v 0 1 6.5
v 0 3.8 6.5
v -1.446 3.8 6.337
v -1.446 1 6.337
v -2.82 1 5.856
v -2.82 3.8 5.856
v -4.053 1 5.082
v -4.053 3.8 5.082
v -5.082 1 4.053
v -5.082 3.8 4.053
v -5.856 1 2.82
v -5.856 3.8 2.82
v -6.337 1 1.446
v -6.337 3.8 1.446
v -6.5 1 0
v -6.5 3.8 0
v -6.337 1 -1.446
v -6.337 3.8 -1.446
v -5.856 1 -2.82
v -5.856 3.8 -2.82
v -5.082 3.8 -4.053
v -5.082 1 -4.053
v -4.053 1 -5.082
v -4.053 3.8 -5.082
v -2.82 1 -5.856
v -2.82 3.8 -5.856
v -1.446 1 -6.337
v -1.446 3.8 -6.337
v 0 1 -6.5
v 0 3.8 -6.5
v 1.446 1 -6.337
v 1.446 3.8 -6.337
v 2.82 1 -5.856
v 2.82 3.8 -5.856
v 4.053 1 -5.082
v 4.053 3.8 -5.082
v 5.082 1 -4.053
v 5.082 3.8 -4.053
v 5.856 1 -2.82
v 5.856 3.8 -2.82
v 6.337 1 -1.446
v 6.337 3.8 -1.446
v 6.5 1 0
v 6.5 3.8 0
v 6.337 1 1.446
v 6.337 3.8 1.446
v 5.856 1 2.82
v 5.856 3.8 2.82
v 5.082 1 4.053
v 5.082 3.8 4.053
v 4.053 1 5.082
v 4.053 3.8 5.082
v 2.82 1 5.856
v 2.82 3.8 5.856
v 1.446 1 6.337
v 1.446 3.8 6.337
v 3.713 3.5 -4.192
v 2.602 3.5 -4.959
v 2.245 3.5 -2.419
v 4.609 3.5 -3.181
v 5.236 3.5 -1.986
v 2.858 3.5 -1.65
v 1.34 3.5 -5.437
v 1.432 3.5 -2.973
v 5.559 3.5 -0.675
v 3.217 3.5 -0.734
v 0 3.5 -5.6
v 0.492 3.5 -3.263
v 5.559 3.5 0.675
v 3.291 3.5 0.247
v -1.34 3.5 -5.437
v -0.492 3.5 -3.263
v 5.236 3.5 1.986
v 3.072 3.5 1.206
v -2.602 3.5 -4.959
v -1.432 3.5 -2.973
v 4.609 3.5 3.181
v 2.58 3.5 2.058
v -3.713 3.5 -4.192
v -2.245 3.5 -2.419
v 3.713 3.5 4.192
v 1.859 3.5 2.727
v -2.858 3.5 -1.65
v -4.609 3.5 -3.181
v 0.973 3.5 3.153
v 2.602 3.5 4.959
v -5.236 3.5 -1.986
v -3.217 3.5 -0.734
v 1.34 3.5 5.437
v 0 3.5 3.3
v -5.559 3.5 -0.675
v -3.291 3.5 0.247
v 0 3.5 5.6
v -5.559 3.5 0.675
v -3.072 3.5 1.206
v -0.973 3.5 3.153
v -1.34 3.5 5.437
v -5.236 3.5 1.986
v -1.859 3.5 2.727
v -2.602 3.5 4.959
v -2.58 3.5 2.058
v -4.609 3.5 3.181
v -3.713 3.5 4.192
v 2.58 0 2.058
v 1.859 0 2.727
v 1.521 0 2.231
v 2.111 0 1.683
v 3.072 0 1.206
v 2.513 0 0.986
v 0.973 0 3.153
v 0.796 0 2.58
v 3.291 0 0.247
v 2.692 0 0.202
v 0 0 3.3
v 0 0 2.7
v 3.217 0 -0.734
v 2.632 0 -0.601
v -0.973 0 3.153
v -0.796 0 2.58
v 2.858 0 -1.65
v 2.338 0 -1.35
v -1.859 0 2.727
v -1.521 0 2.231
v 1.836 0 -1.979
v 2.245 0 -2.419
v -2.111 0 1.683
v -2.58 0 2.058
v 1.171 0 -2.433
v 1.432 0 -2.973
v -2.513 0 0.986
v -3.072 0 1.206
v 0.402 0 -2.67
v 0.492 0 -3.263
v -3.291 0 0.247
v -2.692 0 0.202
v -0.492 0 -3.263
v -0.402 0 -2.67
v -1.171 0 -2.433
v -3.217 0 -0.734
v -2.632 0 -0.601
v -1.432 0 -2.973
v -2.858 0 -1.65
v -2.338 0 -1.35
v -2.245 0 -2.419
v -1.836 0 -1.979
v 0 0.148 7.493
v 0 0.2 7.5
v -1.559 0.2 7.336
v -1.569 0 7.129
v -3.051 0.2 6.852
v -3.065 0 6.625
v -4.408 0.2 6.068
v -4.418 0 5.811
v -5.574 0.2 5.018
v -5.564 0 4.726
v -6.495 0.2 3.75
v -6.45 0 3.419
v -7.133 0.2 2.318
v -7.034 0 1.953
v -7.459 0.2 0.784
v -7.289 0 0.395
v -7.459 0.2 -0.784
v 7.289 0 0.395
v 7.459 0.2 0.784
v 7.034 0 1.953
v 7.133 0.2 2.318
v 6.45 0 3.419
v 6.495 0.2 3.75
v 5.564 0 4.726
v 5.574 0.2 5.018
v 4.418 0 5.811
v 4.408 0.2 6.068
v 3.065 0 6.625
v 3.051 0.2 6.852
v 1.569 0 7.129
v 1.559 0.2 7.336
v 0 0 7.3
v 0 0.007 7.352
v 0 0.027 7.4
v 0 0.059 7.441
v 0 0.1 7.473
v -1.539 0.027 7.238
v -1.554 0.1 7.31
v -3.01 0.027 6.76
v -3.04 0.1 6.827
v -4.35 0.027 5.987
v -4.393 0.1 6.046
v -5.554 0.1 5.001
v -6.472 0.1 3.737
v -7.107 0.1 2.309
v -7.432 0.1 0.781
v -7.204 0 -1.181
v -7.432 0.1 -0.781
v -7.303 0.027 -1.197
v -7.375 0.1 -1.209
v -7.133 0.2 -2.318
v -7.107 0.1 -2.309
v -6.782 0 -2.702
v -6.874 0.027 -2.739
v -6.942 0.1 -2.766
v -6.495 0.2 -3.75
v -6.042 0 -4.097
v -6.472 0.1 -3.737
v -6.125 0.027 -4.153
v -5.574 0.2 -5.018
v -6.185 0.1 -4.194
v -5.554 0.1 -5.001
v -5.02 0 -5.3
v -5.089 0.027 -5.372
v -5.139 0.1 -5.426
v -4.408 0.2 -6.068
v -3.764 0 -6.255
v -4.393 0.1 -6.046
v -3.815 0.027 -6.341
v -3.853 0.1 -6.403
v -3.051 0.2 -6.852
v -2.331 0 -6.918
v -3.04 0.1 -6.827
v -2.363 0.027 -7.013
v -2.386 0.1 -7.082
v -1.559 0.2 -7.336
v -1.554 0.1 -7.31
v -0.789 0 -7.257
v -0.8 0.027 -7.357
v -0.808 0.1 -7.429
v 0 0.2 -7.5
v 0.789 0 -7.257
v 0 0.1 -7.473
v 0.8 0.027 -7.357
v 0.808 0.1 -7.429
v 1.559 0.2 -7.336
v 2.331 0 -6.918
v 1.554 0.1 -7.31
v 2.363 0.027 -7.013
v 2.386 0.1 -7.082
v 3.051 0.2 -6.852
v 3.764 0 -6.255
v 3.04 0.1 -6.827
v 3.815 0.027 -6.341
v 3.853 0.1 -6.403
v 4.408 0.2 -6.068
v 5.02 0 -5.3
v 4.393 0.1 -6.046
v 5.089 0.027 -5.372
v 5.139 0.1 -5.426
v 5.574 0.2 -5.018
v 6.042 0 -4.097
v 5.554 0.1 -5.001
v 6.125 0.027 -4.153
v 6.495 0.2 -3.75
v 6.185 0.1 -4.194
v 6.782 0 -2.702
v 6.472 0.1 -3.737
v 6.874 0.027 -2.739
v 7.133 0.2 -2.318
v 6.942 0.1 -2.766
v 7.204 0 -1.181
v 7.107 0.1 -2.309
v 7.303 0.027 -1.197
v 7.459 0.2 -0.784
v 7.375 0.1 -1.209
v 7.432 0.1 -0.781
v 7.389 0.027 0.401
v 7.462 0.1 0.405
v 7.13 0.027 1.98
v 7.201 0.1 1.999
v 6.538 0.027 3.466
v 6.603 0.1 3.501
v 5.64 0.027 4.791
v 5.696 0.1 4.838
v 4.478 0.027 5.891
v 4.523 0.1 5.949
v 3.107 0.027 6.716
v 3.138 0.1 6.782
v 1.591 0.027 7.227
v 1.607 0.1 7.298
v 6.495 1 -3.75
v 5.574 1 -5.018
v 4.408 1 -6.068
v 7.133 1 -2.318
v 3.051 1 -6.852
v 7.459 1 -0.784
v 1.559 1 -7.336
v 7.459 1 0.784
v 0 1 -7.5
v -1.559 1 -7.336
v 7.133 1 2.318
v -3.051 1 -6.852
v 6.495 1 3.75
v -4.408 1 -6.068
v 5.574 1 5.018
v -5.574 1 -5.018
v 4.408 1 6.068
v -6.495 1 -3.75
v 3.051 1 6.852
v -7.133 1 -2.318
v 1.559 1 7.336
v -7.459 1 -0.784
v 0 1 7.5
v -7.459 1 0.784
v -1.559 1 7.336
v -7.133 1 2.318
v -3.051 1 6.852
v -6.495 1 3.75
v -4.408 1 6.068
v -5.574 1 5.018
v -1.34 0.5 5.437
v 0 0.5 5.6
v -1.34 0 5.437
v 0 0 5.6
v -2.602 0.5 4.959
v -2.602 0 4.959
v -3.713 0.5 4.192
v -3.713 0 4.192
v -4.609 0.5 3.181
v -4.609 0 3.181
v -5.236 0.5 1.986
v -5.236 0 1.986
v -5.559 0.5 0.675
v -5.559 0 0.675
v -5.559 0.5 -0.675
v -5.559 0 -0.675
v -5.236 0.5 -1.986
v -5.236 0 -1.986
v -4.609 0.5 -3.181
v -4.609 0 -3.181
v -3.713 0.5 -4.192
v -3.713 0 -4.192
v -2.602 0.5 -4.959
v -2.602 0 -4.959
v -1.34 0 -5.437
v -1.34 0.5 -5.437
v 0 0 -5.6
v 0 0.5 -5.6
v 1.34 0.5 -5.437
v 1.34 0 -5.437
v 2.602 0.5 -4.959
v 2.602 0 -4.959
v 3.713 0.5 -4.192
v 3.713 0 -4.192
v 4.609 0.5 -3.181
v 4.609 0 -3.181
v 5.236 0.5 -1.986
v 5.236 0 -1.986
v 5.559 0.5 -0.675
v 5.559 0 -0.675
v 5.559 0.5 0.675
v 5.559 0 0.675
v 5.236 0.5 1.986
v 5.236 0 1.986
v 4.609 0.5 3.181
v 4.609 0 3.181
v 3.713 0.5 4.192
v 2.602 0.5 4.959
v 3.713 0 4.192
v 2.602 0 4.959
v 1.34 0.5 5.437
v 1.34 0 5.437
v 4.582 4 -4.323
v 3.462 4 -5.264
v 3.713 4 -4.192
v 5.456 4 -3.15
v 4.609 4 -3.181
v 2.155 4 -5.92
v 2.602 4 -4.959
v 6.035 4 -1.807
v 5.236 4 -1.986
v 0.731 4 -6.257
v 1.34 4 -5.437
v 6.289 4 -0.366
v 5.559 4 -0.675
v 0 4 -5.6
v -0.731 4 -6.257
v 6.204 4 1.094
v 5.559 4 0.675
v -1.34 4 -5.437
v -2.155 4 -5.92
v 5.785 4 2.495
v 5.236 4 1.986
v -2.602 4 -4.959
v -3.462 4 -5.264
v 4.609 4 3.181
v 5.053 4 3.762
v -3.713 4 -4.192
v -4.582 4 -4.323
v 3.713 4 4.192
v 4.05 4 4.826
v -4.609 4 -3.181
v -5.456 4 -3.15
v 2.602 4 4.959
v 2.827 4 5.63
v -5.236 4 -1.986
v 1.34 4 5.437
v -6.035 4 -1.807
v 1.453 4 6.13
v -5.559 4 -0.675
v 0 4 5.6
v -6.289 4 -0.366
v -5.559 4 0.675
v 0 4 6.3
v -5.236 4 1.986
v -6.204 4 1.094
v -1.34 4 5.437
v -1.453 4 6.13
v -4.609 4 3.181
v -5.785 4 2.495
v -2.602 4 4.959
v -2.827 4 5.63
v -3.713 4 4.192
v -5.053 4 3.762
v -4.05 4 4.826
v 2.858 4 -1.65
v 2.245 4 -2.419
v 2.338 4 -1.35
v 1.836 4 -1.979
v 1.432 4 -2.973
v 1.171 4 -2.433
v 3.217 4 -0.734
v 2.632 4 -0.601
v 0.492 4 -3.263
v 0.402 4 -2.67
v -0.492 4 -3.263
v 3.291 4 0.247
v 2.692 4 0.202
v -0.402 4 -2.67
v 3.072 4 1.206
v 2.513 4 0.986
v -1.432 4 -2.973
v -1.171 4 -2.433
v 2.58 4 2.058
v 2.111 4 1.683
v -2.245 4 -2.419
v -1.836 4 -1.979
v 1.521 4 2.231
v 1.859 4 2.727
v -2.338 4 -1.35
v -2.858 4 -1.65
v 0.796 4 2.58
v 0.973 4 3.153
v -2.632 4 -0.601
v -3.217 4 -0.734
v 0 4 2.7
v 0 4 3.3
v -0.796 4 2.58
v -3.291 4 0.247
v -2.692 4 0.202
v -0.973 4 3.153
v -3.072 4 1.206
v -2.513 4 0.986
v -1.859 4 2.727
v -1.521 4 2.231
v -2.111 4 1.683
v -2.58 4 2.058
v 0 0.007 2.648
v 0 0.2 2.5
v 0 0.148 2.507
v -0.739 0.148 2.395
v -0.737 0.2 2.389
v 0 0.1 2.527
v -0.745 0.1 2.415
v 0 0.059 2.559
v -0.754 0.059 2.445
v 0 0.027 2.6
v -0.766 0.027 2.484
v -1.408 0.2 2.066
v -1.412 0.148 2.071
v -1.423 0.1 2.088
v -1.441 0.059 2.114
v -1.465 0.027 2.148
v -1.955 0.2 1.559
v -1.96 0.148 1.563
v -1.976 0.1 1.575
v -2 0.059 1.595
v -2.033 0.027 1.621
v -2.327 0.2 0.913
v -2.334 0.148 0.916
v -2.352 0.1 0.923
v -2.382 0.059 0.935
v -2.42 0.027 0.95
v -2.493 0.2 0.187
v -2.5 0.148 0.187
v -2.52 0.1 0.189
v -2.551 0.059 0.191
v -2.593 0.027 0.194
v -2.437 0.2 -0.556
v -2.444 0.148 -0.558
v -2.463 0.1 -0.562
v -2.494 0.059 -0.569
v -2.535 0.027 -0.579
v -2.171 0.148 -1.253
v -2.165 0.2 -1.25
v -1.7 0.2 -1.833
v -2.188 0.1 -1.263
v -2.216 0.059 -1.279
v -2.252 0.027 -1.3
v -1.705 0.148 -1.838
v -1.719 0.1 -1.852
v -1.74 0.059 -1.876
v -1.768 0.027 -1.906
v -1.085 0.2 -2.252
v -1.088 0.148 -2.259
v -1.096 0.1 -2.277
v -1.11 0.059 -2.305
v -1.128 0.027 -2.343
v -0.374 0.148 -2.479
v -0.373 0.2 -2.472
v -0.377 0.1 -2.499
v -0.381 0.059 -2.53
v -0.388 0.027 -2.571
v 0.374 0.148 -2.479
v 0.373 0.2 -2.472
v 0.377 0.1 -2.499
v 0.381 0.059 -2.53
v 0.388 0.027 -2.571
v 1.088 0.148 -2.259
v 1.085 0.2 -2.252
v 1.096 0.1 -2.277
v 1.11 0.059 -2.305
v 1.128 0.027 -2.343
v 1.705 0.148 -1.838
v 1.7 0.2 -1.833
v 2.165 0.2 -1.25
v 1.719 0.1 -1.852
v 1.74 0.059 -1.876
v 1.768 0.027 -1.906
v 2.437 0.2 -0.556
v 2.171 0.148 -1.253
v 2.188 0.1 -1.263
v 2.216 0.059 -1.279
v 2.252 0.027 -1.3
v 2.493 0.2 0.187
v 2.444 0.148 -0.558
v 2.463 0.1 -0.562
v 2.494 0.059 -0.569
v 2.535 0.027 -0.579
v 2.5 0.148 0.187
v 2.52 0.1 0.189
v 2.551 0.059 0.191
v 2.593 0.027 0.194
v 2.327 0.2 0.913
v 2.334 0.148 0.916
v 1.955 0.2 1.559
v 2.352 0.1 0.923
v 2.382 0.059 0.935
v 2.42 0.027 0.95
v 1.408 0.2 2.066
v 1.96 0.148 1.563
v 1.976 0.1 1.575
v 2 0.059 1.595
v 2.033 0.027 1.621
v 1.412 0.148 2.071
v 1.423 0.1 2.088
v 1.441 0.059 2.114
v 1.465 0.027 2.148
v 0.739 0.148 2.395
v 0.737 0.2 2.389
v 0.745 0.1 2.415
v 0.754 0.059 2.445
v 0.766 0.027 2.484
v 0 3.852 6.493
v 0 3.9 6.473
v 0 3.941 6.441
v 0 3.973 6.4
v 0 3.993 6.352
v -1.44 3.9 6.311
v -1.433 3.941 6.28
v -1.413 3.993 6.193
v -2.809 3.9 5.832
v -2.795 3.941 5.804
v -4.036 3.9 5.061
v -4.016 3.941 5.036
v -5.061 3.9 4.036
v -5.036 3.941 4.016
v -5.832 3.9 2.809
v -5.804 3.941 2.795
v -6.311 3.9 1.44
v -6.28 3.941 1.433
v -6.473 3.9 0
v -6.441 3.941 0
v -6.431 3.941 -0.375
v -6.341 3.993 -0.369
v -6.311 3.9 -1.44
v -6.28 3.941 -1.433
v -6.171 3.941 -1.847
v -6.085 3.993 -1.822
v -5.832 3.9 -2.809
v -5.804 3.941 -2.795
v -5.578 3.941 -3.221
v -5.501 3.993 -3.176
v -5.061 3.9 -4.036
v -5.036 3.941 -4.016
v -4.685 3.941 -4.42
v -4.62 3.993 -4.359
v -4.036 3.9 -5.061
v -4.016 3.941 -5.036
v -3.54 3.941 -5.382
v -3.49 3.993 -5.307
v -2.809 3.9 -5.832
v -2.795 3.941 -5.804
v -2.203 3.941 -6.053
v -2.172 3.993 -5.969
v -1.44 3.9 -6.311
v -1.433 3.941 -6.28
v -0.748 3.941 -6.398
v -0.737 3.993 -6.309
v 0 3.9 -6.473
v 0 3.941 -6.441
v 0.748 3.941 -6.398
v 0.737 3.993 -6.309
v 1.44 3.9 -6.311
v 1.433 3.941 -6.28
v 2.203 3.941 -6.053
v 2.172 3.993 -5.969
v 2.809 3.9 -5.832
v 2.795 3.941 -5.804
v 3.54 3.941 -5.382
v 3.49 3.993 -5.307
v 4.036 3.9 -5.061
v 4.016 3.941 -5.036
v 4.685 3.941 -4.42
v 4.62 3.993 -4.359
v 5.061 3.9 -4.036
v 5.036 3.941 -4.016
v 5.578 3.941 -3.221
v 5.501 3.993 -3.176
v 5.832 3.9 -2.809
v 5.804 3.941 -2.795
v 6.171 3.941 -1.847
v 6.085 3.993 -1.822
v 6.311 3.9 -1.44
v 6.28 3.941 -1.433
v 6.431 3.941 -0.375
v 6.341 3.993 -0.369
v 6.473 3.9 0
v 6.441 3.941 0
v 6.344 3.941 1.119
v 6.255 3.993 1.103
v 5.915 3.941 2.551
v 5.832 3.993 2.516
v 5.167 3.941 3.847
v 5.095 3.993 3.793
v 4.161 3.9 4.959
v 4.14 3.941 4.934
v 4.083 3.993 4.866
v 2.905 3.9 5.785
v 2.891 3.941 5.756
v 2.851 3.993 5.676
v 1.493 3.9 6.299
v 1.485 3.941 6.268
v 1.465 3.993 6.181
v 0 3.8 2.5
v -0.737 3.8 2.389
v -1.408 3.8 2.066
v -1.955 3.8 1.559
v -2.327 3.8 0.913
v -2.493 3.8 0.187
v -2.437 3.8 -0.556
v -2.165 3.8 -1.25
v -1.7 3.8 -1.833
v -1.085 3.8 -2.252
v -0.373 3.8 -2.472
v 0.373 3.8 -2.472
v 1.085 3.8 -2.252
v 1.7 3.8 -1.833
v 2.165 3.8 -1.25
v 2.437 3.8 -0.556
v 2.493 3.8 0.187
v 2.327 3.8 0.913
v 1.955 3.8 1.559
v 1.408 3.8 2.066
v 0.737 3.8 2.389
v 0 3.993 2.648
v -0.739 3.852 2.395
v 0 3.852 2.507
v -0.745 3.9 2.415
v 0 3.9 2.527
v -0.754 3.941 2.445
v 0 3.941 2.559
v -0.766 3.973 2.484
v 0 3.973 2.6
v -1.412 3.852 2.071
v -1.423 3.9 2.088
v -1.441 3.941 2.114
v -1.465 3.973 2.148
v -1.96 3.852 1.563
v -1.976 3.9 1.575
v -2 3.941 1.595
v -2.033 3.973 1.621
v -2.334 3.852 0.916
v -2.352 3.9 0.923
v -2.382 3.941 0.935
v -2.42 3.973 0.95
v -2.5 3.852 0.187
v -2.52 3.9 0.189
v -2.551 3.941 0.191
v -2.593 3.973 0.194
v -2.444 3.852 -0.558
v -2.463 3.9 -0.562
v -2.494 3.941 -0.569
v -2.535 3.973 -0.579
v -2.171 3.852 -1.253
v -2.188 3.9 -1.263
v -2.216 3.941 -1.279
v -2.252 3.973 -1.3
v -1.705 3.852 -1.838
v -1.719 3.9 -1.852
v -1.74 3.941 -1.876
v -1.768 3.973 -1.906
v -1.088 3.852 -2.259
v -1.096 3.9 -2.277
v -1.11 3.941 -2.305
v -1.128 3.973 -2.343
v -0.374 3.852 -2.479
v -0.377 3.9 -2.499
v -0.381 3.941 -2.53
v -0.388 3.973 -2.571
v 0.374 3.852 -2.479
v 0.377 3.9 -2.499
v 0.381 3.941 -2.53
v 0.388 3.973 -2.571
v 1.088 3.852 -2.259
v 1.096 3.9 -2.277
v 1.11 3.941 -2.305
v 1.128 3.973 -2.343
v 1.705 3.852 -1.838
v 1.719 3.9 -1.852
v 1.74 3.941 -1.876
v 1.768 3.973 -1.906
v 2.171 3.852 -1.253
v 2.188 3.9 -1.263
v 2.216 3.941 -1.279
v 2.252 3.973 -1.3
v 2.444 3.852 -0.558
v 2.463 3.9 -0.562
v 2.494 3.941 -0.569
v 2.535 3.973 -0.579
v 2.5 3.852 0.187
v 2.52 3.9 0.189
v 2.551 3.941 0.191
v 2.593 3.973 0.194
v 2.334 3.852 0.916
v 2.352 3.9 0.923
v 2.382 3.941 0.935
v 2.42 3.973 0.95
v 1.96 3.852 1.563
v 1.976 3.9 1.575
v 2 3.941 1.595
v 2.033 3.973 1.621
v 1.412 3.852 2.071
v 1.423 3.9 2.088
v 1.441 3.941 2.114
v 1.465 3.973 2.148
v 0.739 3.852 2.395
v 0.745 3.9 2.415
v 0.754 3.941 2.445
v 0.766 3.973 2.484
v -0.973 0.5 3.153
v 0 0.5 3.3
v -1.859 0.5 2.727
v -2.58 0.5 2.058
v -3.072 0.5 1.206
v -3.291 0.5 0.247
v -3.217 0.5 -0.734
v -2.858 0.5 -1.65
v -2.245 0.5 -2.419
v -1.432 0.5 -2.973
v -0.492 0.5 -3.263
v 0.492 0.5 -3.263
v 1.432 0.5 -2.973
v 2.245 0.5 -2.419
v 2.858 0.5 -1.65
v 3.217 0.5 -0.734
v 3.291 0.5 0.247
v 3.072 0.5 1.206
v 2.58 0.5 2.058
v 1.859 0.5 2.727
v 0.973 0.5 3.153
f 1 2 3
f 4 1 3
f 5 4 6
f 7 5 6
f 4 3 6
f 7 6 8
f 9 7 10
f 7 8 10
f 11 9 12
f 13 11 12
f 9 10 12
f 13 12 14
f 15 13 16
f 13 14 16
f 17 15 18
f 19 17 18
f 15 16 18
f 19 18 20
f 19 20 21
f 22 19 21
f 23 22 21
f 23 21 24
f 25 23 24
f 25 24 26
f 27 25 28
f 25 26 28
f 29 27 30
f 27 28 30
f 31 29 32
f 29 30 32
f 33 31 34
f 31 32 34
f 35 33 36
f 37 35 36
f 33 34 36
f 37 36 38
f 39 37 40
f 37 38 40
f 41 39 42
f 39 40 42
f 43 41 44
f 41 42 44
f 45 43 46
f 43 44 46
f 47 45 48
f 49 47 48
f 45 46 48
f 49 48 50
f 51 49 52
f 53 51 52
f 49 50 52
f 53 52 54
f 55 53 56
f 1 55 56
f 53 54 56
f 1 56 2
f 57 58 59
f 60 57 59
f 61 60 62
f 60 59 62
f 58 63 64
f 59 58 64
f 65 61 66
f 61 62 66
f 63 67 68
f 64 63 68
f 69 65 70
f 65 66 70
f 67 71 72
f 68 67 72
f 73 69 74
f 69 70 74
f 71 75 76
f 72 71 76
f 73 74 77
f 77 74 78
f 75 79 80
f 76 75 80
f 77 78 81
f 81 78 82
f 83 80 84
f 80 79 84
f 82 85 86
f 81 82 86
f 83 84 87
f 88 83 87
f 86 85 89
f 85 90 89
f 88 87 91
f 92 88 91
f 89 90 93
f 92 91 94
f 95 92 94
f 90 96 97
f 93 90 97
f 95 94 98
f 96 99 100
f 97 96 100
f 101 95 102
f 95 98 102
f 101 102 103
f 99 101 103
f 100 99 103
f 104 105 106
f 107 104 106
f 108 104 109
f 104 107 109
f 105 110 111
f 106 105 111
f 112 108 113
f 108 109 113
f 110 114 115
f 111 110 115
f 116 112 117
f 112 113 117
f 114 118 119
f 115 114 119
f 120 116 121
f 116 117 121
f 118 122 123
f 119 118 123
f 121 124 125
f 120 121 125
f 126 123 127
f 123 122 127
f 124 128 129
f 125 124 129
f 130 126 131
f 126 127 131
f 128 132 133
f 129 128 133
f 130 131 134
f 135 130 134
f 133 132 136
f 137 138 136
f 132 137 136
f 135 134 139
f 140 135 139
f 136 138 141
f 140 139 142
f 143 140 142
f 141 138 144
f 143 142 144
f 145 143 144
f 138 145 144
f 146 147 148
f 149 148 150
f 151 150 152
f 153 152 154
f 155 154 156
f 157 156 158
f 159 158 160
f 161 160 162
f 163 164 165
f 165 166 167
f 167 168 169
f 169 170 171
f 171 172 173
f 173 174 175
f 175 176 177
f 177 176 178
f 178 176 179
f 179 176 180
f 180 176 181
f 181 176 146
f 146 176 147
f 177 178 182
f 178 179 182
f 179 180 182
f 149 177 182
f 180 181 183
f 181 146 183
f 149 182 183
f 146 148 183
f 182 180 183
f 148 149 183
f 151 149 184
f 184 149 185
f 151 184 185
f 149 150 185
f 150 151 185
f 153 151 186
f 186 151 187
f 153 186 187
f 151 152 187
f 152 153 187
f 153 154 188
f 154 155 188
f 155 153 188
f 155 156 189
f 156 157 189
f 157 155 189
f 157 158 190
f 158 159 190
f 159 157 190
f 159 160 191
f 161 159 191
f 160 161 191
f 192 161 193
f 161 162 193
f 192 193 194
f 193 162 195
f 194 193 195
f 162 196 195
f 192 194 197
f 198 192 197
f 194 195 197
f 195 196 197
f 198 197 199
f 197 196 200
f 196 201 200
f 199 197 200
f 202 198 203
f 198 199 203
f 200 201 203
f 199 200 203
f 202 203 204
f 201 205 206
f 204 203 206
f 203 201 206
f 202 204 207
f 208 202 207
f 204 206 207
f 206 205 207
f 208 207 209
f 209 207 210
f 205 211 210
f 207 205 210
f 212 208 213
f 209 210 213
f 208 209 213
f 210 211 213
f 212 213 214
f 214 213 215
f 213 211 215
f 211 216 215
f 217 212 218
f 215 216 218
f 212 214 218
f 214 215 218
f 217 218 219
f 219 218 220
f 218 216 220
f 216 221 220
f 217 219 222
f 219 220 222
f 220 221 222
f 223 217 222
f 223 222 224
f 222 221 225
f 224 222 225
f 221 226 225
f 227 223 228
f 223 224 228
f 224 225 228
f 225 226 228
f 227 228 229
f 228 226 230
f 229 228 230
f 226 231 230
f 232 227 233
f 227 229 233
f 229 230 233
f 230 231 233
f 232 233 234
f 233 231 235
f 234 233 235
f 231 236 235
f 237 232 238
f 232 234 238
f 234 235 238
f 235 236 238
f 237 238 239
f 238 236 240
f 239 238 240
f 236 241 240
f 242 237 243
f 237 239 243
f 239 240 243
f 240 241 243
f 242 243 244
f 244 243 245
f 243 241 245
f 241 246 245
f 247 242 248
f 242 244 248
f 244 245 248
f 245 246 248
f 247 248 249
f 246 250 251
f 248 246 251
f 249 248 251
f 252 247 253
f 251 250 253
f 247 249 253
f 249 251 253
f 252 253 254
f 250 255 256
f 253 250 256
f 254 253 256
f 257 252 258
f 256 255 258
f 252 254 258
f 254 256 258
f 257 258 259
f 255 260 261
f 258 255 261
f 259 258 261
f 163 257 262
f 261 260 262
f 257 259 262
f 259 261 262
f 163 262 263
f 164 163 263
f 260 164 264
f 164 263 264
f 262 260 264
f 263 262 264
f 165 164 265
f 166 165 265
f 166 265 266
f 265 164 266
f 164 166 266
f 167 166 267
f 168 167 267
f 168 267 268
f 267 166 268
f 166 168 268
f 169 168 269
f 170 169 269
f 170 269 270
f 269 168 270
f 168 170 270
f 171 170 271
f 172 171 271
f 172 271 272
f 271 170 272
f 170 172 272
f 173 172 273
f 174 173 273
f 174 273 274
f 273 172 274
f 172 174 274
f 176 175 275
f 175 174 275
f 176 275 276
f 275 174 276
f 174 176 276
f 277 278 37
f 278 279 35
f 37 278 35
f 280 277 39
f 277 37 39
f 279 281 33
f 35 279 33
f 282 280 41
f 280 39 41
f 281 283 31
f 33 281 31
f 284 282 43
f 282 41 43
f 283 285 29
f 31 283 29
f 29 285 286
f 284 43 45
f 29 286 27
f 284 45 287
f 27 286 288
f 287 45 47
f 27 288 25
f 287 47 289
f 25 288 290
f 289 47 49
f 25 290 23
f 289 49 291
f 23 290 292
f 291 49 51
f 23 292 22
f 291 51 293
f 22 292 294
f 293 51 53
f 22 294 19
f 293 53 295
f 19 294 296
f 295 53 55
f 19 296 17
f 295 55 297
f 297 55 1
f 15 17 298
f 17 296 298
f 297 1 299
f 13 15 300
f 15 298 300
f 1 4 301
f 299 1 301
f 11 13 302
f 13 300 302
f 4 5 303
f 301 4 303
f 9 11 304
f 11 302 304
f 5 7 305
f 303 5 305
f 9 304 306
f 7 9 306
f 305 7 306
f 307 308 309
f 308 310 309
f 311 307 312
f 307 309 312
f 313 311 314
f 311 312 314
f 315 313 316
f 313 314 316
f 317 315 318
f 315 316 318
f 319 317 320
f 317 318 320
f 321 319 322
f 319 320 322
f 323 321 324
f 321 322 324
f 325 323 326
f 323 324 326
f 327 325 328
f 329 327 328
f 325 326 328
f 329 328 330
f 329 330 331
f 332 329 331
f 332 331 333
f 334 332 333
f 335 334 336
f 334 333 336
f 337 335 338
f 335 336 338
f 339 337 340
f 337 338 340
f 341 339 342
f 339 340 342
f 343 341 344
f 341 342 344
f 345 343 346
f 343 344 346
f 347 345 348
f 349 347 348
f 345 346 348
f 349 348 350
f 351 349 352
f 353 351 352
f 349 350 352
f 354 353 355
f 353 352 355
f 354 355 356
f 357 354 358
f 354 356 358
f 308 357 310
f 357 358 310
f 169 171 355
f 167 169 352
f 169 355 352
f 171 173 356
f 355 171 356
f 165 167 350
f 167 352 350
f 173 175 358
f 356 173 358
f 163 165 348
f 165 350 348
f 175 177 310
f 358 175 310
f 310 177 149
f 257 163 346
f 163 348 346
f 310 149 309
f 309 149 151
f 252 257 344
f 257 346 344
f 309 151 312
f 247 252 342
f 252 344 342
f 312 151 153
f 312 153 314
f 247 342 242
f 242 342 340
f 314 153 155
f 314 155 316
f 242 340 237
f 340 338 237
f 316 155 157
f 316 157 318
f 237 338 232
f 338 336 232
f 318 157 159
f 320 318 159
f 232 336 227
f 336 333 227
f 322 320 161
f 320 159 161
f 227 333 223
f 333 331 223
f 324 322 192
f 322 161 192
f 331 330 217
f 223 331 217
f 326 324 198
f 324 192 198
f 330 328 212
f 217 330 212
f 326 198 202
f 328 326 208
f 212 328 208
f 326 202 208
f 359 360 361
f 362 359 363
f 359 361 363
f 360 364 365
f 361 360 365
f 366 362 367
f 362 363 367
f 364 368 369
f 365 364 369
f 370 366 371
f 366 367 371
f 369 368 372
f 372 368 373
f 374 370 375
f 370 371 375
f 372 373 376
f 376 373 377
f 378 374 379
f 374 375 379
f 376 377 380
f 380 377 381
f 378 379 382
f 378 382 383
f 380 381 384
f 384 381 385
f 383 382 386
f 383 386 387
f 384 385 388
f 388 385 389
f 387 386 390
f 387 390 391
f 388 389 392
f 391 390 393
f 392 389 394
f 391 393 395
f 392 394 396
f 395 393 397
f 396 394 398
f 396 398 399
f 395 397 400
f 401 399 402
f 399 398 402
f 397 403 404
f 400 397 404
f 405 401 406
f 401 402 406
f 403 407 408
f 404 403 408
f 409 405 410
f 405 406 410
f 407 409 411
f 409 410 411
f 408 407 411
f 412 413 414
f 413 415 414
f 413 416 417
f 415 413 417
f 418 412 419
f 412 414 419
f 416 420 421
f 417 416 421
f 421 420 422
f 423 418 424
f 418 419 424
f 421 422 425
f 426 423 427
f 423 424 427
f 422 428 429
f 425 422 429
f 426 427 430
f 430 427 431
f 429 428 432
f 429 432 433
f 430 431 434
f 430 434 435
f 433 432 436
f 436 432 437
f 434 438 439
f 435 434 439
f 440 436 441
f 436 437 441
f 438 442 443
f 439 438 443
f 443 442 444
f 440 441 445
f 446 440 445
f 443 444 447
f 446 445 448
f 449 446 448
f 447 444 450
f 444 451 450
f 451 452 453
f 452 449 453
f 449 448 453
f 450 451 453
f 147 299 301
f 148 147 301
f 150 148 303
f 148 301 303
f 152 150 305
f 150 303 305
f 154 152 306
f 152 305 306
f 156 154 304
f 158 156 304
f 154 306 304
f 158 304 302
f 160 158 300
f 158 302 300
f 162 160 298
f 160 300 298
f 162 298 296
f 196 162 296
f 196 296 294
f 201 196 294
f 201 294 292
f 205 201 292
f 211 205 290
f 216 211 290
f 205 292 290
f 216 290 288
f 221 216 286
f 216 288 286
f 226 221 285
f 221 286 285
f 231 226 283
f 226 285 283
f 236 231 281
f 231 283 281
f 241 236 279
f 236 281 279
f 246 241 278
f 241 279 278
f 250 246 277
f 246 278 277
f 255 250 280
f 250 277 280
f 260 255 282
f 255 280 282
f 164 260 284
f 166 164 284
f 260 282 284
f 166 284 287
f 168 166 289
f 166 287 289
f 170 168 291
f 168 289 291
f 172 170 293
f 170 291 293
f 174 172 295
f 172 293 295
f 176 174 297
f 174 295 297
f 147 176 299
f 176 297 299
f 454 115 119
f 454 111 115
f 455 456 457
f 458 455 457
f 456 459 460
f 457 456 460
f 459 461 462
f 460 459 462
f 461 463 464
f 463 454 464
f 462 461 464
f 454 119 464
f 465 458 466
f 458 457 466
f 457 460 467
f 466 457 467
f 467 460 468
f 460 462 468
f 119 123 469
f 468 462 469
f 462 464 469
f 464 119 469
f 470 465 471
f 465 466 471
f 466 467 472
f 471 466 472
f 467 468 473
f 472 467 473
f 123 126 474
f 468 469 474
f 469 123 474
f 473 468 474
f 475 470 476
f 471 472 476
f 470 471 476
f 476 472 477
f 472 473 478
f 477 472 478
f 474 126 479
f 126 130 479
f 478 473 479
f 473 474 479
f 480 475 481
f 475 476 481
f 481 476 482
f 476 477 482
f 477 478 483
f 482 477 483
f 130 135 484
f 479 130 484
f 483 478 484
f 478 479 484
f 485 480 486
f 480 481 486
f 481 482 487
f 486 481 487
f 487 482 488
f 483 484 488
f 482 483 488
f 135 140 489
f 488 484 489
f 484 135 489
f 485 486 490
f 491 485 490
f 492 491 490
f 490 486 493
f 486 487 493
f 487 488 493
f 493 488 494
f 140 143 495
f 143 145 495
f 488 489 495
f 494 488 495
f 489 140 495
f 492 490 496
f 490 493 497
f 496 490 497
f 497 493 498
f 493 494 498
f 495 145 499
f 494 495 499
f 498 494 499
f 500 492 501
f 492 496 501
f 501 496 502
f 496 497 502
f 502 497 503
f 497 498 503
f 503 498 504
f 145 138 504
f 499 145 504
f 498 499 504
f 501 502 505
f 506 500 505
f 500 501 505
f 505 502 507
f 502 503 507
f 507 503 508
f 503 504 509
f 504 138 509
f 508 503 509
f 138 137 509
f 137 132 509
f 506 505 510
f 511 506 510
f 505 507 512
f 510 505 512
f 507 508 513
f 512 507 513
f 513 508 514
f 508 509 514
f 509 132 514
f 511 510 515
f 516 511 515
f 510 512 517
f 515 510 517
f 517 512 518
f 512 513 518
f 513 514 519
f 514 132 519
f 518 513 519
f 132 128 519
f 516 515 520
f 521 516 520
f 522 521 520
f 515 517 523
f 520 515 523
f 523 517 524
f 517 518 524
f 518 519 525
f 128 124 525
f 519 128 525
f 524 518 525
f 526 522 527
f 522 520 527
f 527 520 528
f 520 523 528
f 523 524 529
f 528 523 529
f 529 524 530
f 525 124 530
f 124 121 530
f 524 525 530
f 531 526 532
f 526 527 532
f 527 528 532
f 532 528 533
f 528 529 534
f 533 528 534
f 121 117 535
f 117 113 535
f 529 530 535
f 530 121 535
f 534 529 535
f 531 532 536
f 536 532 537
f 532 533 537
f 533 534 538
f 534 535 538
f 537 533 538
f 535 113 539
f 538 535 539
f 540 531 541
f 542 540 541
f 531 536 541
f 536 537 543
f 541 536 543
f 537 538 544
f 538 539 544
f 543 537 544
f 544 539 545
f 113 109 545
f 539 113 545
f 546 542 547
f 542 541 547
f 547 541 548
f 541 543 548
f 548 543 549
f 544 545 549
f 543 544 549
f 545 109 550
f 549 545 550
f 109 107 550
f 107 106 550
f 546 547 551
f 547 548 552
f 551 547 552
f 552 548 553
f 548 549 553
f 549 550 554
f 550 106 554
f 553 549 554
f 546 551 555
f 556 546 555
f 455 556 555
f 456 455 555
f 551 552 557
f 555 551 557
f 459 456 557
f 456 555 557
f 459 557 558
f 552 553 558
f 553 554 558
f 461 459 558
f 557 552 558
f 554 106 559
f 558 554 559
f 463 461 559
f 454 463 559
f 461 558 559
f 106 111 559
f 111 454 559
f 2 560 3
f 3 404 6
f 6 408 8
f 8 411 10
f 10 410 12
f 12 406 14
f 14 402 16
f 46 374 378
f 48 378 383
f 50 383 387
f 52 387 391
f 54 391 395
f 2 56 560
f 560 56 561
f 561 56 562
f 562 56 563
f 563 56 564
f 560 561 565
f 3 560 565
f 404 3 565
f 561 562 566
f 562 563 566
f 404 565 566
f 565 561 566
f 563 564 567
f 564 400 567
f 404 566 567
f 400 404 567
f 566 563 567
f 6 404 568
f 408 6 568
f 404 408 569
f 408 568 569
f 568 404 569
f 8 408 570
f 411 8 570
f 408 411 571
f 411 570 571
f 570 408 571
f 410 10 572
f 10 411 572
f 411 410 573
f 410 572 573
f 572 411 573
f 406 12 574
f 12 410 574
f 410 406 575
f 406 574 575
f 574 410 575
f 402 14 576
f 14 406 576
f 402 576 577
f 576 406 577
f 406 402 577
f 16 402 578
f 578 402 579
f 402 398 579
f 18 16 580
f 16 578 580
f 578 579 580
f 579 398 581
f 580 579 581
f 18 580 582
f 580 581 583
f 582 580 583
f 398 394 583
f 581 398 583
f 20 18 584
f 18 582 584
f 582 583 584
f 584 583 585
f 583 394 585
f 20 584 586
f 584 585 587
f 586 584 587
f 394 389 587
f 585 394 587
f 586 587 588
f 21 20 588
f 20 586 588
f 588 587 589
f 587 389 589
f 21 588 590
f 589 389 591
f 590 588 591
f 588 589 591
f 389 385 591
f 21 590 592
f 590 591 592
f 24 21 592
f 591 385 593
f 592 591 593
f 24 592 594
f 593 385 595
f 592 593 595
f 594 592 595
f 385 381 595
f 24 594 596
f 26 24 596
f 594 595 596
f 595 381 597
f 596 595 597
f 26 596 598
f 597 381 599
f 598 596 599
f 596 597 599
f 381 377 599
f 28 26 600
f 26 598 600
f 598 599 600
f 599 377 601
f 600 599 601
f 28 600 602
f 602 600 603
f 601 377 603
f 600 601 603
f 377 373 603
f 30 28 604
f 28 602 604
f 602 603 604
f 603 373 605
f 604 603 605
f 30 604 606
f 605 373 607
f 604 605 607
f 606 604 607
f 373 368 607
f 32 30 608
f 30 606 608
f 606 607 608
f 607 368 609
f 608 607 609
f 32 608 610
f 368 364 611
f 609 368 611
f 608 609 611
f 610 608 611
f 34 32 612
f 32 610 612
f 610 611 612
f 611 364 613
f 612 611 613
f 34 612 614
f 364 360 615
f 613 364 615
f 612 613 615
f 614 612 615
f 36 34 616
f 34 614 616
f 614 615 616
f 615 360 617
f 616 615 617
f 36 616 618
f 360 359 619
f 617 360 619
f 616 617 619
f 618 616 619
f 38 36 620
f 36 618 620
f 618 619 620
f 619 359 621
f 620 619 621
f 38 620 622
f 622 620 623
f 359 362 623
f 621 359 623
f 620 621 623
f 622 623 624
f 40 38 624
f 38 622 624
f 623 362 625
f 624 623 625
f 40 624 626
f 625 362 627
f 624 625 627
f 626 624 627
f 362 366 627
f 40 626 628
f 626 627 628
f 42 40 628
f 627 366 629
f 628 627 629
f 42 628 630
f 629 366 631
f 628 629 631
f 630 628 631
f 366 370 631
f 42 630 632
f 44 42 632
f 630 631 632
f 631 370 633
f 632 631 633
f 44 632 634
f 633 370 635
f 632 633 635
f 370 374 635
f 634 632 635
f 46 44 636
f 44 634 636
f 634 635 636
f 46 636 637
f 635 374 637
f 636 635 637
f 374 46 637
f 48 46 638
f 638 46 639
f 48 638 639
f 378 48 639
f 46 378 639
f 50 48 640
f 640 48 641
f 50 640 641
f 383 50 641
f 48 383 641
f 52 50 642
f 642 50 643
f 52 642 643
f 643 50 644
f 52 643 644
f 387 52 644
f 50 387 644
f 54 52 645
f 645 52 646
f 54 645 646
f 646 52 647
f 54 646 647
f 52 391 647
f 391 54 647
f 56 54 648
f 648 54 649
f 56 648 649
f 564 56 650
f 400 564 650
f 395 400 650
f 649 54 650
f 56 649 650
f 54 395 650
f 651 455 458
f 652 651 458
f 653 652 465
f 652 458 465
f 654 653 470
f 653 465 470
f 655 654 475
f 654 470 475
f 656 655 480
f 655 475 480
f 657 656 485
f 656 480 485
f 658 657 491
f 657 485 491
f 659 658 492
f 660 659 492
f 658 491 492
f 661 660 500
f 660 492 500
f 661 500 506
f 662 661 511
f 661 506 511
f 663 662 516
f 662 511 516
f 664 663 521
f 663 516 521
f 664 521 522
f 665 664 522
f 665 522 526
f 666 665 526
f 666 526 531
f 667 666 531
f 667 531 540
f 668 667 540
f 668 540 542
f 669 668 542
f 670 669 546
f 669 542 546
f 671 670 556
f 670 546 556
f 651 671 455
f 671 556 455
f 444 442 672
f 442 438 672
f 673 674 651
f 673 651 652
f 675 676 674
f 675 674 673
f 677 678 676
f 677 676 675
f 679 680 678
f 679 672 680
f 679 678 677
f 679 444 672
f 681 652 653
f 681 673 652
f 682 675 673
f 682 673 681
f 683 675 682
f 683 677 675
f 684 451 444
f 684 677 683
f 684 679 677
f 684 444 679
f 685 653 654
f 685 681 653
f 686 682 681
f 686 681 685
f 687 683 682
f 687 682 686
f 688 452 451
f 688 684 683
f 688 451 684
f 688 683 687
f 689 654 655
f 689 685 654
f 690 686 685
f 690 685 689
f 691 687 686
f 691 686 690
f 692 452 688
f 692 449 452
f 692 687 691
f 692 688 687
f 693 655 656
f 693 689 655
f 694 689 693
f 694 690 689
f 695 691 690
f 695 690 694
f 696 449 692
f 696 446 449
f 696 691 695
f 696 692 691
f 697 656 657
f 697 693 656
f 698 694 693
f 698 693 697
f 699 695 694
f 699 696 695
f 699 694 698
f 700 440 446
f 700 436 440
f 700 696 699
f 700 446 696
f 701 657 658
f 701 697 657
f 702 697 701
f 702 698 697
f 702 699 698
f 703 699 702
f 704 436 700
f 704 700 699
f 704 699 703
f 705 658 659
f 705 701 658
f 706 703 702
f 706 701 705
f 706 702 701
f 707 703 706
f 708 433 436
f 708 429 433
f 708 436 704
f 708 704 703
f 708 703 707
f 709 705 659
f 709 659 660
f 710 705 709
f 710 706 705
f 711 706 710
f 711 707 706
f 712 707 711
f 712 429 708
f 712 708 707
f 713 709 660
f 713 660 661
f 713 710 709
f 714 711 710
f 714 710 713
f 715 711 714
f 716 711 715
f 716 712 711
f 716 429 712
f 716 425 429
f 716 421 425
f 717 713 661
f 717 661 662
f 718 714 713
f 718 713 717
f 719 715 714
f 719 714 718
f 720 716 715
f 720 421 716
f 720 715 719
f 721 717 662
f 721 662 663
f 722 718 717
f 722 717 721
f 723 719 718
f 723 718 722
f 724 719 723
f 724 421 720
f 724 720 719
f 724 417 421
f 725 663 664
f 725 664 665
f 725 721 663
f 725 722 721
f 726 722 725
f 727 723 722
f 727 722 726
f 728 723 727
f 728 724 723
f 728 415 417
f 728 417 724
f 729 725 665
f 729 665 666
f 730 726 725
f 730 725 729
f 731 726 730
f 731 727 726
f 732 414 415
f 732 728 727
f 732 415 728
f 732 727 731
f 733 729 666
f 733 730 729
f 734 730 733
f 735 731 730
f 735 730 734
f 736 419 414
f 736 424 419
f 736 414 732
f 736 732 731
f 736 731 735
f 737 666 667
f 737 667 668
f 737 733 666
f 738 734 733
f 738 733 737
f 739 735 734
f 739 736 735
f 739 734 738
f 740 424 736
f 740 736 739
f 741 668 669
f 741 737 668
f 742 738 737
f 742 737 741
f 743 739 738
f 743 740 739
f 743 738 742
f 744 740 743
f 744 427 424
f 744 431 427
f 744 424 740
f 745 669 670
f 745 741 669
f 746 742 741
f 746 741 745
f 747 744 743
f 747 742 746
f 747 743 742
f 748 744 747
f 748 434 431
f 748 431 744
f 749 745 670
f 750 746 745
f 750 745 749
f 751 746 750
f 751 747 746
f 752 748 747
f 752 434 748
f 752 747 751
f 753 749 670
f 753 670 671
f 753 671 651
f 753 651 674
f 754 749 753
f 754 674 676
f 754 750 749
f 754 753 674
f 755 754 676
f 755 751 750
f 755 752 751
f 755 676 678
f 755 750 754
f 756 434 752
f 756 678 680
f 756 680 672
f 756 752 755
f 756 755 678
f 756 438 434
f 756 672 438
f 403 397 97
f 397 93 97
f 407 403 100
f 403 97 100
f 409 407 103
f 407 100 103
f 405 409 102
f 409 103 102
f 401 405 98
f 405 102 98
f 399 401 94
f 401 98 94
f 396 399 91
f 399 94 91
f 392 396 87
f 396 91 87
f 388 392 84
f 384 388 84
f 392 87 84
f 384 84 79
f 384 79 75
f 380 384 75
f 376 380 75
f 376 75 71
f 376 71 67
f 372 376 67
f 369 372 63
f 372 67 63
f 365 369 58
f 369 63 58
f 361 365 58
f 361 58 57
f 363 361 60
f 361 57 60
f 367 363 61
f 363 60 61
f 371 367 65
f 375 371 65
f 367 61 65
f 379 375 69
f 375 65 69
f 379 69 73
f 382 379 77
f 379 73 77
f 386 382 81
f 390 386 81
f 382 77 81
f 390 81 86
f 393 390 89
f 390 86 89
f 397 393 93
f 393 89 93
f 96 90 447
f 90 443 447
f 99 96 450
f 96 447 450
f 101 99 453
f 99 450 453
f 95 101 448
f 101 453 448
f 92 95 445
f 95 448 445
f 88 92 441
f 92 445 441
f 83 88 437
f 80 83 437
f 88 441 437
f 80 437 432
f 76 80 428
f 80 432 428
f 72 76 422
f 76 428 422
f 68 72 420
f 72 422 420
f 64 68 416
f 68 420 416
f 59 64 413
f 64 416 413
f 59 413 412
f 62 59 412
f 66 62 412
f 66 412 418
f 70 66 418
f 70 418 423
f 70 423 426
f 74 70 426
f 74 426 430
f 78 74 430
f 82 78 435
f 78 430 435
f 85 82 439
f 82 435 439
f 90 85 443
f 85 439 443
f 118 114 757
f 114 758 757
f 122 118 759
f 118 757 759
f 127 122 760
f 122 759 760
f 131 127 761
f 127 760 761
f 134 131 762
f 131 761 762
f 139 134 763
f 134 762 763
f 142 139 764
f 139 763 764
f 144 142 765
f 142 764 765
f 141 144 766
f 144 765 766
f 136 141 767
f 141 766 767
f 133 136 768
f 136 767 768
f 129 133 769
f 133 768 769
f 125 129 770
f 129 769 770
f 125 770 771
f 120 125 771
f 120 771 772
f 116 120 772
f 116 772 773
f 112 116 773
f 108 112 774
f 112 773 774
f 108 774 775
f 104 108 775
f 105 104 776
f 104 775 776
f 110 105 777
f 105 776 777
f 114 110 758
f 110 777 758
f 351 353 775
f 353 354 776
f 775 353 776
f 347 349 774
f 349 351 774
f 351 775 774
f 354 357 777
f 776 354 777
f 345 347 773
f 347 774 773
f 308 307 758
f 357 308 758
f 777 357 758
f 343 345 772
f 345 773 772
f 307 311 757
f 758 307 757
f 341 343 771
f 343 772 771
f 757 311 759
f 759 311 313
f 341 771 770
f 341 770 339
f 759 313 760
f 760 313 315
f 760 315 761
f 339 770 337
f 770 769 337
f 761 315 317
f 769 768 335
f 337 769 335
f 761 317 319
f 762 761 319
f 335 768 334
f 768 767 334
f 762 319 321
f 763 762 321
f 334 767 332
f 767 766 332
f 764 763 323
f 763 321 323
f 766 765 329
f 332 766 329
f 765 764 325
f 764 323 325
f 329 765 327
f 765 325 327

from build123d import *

# Parameters (mm, degrees)
FILLET_1_R = 0.2


with BuildPart() as part:
    # 草图1 → 旋转1 (revolve)
    with BuildSketch(Plane.XY, mode=Mode.PRIVATE) as revolve_1_sk:
        Polygon((2.5, 4), (2.5, 0), (3.3, 0), (3.3, 0.5), (5.6, 0.5), (5.6, 0), (7.5, 0), (7.5, 1), (6.5, 1), (6.5, 4), (5.6, 4), (5.6, 3.5), (3.3, 3.5), (3.3, 4), align=None)
    revolve(revolve_1_sk.sketch.rotate(Axis((0, 5.412170411, 0), (0, -1, 0)), 90), axis=Axis((0, 5.412170411, 0), (0, -1, 0)))

    # 圆角1
    fillet_1_edges = [part.edges().sort_by_distance(p)[0] for p in [
        (0, 0, -2.5),
        (0, 4, -2.5),
        (0, 4, -6.5),
        (0, 0, -7.5),
    ]]
    fillet(fillet_1_edges, radius=FILLET_1_R)


solid = part.part
